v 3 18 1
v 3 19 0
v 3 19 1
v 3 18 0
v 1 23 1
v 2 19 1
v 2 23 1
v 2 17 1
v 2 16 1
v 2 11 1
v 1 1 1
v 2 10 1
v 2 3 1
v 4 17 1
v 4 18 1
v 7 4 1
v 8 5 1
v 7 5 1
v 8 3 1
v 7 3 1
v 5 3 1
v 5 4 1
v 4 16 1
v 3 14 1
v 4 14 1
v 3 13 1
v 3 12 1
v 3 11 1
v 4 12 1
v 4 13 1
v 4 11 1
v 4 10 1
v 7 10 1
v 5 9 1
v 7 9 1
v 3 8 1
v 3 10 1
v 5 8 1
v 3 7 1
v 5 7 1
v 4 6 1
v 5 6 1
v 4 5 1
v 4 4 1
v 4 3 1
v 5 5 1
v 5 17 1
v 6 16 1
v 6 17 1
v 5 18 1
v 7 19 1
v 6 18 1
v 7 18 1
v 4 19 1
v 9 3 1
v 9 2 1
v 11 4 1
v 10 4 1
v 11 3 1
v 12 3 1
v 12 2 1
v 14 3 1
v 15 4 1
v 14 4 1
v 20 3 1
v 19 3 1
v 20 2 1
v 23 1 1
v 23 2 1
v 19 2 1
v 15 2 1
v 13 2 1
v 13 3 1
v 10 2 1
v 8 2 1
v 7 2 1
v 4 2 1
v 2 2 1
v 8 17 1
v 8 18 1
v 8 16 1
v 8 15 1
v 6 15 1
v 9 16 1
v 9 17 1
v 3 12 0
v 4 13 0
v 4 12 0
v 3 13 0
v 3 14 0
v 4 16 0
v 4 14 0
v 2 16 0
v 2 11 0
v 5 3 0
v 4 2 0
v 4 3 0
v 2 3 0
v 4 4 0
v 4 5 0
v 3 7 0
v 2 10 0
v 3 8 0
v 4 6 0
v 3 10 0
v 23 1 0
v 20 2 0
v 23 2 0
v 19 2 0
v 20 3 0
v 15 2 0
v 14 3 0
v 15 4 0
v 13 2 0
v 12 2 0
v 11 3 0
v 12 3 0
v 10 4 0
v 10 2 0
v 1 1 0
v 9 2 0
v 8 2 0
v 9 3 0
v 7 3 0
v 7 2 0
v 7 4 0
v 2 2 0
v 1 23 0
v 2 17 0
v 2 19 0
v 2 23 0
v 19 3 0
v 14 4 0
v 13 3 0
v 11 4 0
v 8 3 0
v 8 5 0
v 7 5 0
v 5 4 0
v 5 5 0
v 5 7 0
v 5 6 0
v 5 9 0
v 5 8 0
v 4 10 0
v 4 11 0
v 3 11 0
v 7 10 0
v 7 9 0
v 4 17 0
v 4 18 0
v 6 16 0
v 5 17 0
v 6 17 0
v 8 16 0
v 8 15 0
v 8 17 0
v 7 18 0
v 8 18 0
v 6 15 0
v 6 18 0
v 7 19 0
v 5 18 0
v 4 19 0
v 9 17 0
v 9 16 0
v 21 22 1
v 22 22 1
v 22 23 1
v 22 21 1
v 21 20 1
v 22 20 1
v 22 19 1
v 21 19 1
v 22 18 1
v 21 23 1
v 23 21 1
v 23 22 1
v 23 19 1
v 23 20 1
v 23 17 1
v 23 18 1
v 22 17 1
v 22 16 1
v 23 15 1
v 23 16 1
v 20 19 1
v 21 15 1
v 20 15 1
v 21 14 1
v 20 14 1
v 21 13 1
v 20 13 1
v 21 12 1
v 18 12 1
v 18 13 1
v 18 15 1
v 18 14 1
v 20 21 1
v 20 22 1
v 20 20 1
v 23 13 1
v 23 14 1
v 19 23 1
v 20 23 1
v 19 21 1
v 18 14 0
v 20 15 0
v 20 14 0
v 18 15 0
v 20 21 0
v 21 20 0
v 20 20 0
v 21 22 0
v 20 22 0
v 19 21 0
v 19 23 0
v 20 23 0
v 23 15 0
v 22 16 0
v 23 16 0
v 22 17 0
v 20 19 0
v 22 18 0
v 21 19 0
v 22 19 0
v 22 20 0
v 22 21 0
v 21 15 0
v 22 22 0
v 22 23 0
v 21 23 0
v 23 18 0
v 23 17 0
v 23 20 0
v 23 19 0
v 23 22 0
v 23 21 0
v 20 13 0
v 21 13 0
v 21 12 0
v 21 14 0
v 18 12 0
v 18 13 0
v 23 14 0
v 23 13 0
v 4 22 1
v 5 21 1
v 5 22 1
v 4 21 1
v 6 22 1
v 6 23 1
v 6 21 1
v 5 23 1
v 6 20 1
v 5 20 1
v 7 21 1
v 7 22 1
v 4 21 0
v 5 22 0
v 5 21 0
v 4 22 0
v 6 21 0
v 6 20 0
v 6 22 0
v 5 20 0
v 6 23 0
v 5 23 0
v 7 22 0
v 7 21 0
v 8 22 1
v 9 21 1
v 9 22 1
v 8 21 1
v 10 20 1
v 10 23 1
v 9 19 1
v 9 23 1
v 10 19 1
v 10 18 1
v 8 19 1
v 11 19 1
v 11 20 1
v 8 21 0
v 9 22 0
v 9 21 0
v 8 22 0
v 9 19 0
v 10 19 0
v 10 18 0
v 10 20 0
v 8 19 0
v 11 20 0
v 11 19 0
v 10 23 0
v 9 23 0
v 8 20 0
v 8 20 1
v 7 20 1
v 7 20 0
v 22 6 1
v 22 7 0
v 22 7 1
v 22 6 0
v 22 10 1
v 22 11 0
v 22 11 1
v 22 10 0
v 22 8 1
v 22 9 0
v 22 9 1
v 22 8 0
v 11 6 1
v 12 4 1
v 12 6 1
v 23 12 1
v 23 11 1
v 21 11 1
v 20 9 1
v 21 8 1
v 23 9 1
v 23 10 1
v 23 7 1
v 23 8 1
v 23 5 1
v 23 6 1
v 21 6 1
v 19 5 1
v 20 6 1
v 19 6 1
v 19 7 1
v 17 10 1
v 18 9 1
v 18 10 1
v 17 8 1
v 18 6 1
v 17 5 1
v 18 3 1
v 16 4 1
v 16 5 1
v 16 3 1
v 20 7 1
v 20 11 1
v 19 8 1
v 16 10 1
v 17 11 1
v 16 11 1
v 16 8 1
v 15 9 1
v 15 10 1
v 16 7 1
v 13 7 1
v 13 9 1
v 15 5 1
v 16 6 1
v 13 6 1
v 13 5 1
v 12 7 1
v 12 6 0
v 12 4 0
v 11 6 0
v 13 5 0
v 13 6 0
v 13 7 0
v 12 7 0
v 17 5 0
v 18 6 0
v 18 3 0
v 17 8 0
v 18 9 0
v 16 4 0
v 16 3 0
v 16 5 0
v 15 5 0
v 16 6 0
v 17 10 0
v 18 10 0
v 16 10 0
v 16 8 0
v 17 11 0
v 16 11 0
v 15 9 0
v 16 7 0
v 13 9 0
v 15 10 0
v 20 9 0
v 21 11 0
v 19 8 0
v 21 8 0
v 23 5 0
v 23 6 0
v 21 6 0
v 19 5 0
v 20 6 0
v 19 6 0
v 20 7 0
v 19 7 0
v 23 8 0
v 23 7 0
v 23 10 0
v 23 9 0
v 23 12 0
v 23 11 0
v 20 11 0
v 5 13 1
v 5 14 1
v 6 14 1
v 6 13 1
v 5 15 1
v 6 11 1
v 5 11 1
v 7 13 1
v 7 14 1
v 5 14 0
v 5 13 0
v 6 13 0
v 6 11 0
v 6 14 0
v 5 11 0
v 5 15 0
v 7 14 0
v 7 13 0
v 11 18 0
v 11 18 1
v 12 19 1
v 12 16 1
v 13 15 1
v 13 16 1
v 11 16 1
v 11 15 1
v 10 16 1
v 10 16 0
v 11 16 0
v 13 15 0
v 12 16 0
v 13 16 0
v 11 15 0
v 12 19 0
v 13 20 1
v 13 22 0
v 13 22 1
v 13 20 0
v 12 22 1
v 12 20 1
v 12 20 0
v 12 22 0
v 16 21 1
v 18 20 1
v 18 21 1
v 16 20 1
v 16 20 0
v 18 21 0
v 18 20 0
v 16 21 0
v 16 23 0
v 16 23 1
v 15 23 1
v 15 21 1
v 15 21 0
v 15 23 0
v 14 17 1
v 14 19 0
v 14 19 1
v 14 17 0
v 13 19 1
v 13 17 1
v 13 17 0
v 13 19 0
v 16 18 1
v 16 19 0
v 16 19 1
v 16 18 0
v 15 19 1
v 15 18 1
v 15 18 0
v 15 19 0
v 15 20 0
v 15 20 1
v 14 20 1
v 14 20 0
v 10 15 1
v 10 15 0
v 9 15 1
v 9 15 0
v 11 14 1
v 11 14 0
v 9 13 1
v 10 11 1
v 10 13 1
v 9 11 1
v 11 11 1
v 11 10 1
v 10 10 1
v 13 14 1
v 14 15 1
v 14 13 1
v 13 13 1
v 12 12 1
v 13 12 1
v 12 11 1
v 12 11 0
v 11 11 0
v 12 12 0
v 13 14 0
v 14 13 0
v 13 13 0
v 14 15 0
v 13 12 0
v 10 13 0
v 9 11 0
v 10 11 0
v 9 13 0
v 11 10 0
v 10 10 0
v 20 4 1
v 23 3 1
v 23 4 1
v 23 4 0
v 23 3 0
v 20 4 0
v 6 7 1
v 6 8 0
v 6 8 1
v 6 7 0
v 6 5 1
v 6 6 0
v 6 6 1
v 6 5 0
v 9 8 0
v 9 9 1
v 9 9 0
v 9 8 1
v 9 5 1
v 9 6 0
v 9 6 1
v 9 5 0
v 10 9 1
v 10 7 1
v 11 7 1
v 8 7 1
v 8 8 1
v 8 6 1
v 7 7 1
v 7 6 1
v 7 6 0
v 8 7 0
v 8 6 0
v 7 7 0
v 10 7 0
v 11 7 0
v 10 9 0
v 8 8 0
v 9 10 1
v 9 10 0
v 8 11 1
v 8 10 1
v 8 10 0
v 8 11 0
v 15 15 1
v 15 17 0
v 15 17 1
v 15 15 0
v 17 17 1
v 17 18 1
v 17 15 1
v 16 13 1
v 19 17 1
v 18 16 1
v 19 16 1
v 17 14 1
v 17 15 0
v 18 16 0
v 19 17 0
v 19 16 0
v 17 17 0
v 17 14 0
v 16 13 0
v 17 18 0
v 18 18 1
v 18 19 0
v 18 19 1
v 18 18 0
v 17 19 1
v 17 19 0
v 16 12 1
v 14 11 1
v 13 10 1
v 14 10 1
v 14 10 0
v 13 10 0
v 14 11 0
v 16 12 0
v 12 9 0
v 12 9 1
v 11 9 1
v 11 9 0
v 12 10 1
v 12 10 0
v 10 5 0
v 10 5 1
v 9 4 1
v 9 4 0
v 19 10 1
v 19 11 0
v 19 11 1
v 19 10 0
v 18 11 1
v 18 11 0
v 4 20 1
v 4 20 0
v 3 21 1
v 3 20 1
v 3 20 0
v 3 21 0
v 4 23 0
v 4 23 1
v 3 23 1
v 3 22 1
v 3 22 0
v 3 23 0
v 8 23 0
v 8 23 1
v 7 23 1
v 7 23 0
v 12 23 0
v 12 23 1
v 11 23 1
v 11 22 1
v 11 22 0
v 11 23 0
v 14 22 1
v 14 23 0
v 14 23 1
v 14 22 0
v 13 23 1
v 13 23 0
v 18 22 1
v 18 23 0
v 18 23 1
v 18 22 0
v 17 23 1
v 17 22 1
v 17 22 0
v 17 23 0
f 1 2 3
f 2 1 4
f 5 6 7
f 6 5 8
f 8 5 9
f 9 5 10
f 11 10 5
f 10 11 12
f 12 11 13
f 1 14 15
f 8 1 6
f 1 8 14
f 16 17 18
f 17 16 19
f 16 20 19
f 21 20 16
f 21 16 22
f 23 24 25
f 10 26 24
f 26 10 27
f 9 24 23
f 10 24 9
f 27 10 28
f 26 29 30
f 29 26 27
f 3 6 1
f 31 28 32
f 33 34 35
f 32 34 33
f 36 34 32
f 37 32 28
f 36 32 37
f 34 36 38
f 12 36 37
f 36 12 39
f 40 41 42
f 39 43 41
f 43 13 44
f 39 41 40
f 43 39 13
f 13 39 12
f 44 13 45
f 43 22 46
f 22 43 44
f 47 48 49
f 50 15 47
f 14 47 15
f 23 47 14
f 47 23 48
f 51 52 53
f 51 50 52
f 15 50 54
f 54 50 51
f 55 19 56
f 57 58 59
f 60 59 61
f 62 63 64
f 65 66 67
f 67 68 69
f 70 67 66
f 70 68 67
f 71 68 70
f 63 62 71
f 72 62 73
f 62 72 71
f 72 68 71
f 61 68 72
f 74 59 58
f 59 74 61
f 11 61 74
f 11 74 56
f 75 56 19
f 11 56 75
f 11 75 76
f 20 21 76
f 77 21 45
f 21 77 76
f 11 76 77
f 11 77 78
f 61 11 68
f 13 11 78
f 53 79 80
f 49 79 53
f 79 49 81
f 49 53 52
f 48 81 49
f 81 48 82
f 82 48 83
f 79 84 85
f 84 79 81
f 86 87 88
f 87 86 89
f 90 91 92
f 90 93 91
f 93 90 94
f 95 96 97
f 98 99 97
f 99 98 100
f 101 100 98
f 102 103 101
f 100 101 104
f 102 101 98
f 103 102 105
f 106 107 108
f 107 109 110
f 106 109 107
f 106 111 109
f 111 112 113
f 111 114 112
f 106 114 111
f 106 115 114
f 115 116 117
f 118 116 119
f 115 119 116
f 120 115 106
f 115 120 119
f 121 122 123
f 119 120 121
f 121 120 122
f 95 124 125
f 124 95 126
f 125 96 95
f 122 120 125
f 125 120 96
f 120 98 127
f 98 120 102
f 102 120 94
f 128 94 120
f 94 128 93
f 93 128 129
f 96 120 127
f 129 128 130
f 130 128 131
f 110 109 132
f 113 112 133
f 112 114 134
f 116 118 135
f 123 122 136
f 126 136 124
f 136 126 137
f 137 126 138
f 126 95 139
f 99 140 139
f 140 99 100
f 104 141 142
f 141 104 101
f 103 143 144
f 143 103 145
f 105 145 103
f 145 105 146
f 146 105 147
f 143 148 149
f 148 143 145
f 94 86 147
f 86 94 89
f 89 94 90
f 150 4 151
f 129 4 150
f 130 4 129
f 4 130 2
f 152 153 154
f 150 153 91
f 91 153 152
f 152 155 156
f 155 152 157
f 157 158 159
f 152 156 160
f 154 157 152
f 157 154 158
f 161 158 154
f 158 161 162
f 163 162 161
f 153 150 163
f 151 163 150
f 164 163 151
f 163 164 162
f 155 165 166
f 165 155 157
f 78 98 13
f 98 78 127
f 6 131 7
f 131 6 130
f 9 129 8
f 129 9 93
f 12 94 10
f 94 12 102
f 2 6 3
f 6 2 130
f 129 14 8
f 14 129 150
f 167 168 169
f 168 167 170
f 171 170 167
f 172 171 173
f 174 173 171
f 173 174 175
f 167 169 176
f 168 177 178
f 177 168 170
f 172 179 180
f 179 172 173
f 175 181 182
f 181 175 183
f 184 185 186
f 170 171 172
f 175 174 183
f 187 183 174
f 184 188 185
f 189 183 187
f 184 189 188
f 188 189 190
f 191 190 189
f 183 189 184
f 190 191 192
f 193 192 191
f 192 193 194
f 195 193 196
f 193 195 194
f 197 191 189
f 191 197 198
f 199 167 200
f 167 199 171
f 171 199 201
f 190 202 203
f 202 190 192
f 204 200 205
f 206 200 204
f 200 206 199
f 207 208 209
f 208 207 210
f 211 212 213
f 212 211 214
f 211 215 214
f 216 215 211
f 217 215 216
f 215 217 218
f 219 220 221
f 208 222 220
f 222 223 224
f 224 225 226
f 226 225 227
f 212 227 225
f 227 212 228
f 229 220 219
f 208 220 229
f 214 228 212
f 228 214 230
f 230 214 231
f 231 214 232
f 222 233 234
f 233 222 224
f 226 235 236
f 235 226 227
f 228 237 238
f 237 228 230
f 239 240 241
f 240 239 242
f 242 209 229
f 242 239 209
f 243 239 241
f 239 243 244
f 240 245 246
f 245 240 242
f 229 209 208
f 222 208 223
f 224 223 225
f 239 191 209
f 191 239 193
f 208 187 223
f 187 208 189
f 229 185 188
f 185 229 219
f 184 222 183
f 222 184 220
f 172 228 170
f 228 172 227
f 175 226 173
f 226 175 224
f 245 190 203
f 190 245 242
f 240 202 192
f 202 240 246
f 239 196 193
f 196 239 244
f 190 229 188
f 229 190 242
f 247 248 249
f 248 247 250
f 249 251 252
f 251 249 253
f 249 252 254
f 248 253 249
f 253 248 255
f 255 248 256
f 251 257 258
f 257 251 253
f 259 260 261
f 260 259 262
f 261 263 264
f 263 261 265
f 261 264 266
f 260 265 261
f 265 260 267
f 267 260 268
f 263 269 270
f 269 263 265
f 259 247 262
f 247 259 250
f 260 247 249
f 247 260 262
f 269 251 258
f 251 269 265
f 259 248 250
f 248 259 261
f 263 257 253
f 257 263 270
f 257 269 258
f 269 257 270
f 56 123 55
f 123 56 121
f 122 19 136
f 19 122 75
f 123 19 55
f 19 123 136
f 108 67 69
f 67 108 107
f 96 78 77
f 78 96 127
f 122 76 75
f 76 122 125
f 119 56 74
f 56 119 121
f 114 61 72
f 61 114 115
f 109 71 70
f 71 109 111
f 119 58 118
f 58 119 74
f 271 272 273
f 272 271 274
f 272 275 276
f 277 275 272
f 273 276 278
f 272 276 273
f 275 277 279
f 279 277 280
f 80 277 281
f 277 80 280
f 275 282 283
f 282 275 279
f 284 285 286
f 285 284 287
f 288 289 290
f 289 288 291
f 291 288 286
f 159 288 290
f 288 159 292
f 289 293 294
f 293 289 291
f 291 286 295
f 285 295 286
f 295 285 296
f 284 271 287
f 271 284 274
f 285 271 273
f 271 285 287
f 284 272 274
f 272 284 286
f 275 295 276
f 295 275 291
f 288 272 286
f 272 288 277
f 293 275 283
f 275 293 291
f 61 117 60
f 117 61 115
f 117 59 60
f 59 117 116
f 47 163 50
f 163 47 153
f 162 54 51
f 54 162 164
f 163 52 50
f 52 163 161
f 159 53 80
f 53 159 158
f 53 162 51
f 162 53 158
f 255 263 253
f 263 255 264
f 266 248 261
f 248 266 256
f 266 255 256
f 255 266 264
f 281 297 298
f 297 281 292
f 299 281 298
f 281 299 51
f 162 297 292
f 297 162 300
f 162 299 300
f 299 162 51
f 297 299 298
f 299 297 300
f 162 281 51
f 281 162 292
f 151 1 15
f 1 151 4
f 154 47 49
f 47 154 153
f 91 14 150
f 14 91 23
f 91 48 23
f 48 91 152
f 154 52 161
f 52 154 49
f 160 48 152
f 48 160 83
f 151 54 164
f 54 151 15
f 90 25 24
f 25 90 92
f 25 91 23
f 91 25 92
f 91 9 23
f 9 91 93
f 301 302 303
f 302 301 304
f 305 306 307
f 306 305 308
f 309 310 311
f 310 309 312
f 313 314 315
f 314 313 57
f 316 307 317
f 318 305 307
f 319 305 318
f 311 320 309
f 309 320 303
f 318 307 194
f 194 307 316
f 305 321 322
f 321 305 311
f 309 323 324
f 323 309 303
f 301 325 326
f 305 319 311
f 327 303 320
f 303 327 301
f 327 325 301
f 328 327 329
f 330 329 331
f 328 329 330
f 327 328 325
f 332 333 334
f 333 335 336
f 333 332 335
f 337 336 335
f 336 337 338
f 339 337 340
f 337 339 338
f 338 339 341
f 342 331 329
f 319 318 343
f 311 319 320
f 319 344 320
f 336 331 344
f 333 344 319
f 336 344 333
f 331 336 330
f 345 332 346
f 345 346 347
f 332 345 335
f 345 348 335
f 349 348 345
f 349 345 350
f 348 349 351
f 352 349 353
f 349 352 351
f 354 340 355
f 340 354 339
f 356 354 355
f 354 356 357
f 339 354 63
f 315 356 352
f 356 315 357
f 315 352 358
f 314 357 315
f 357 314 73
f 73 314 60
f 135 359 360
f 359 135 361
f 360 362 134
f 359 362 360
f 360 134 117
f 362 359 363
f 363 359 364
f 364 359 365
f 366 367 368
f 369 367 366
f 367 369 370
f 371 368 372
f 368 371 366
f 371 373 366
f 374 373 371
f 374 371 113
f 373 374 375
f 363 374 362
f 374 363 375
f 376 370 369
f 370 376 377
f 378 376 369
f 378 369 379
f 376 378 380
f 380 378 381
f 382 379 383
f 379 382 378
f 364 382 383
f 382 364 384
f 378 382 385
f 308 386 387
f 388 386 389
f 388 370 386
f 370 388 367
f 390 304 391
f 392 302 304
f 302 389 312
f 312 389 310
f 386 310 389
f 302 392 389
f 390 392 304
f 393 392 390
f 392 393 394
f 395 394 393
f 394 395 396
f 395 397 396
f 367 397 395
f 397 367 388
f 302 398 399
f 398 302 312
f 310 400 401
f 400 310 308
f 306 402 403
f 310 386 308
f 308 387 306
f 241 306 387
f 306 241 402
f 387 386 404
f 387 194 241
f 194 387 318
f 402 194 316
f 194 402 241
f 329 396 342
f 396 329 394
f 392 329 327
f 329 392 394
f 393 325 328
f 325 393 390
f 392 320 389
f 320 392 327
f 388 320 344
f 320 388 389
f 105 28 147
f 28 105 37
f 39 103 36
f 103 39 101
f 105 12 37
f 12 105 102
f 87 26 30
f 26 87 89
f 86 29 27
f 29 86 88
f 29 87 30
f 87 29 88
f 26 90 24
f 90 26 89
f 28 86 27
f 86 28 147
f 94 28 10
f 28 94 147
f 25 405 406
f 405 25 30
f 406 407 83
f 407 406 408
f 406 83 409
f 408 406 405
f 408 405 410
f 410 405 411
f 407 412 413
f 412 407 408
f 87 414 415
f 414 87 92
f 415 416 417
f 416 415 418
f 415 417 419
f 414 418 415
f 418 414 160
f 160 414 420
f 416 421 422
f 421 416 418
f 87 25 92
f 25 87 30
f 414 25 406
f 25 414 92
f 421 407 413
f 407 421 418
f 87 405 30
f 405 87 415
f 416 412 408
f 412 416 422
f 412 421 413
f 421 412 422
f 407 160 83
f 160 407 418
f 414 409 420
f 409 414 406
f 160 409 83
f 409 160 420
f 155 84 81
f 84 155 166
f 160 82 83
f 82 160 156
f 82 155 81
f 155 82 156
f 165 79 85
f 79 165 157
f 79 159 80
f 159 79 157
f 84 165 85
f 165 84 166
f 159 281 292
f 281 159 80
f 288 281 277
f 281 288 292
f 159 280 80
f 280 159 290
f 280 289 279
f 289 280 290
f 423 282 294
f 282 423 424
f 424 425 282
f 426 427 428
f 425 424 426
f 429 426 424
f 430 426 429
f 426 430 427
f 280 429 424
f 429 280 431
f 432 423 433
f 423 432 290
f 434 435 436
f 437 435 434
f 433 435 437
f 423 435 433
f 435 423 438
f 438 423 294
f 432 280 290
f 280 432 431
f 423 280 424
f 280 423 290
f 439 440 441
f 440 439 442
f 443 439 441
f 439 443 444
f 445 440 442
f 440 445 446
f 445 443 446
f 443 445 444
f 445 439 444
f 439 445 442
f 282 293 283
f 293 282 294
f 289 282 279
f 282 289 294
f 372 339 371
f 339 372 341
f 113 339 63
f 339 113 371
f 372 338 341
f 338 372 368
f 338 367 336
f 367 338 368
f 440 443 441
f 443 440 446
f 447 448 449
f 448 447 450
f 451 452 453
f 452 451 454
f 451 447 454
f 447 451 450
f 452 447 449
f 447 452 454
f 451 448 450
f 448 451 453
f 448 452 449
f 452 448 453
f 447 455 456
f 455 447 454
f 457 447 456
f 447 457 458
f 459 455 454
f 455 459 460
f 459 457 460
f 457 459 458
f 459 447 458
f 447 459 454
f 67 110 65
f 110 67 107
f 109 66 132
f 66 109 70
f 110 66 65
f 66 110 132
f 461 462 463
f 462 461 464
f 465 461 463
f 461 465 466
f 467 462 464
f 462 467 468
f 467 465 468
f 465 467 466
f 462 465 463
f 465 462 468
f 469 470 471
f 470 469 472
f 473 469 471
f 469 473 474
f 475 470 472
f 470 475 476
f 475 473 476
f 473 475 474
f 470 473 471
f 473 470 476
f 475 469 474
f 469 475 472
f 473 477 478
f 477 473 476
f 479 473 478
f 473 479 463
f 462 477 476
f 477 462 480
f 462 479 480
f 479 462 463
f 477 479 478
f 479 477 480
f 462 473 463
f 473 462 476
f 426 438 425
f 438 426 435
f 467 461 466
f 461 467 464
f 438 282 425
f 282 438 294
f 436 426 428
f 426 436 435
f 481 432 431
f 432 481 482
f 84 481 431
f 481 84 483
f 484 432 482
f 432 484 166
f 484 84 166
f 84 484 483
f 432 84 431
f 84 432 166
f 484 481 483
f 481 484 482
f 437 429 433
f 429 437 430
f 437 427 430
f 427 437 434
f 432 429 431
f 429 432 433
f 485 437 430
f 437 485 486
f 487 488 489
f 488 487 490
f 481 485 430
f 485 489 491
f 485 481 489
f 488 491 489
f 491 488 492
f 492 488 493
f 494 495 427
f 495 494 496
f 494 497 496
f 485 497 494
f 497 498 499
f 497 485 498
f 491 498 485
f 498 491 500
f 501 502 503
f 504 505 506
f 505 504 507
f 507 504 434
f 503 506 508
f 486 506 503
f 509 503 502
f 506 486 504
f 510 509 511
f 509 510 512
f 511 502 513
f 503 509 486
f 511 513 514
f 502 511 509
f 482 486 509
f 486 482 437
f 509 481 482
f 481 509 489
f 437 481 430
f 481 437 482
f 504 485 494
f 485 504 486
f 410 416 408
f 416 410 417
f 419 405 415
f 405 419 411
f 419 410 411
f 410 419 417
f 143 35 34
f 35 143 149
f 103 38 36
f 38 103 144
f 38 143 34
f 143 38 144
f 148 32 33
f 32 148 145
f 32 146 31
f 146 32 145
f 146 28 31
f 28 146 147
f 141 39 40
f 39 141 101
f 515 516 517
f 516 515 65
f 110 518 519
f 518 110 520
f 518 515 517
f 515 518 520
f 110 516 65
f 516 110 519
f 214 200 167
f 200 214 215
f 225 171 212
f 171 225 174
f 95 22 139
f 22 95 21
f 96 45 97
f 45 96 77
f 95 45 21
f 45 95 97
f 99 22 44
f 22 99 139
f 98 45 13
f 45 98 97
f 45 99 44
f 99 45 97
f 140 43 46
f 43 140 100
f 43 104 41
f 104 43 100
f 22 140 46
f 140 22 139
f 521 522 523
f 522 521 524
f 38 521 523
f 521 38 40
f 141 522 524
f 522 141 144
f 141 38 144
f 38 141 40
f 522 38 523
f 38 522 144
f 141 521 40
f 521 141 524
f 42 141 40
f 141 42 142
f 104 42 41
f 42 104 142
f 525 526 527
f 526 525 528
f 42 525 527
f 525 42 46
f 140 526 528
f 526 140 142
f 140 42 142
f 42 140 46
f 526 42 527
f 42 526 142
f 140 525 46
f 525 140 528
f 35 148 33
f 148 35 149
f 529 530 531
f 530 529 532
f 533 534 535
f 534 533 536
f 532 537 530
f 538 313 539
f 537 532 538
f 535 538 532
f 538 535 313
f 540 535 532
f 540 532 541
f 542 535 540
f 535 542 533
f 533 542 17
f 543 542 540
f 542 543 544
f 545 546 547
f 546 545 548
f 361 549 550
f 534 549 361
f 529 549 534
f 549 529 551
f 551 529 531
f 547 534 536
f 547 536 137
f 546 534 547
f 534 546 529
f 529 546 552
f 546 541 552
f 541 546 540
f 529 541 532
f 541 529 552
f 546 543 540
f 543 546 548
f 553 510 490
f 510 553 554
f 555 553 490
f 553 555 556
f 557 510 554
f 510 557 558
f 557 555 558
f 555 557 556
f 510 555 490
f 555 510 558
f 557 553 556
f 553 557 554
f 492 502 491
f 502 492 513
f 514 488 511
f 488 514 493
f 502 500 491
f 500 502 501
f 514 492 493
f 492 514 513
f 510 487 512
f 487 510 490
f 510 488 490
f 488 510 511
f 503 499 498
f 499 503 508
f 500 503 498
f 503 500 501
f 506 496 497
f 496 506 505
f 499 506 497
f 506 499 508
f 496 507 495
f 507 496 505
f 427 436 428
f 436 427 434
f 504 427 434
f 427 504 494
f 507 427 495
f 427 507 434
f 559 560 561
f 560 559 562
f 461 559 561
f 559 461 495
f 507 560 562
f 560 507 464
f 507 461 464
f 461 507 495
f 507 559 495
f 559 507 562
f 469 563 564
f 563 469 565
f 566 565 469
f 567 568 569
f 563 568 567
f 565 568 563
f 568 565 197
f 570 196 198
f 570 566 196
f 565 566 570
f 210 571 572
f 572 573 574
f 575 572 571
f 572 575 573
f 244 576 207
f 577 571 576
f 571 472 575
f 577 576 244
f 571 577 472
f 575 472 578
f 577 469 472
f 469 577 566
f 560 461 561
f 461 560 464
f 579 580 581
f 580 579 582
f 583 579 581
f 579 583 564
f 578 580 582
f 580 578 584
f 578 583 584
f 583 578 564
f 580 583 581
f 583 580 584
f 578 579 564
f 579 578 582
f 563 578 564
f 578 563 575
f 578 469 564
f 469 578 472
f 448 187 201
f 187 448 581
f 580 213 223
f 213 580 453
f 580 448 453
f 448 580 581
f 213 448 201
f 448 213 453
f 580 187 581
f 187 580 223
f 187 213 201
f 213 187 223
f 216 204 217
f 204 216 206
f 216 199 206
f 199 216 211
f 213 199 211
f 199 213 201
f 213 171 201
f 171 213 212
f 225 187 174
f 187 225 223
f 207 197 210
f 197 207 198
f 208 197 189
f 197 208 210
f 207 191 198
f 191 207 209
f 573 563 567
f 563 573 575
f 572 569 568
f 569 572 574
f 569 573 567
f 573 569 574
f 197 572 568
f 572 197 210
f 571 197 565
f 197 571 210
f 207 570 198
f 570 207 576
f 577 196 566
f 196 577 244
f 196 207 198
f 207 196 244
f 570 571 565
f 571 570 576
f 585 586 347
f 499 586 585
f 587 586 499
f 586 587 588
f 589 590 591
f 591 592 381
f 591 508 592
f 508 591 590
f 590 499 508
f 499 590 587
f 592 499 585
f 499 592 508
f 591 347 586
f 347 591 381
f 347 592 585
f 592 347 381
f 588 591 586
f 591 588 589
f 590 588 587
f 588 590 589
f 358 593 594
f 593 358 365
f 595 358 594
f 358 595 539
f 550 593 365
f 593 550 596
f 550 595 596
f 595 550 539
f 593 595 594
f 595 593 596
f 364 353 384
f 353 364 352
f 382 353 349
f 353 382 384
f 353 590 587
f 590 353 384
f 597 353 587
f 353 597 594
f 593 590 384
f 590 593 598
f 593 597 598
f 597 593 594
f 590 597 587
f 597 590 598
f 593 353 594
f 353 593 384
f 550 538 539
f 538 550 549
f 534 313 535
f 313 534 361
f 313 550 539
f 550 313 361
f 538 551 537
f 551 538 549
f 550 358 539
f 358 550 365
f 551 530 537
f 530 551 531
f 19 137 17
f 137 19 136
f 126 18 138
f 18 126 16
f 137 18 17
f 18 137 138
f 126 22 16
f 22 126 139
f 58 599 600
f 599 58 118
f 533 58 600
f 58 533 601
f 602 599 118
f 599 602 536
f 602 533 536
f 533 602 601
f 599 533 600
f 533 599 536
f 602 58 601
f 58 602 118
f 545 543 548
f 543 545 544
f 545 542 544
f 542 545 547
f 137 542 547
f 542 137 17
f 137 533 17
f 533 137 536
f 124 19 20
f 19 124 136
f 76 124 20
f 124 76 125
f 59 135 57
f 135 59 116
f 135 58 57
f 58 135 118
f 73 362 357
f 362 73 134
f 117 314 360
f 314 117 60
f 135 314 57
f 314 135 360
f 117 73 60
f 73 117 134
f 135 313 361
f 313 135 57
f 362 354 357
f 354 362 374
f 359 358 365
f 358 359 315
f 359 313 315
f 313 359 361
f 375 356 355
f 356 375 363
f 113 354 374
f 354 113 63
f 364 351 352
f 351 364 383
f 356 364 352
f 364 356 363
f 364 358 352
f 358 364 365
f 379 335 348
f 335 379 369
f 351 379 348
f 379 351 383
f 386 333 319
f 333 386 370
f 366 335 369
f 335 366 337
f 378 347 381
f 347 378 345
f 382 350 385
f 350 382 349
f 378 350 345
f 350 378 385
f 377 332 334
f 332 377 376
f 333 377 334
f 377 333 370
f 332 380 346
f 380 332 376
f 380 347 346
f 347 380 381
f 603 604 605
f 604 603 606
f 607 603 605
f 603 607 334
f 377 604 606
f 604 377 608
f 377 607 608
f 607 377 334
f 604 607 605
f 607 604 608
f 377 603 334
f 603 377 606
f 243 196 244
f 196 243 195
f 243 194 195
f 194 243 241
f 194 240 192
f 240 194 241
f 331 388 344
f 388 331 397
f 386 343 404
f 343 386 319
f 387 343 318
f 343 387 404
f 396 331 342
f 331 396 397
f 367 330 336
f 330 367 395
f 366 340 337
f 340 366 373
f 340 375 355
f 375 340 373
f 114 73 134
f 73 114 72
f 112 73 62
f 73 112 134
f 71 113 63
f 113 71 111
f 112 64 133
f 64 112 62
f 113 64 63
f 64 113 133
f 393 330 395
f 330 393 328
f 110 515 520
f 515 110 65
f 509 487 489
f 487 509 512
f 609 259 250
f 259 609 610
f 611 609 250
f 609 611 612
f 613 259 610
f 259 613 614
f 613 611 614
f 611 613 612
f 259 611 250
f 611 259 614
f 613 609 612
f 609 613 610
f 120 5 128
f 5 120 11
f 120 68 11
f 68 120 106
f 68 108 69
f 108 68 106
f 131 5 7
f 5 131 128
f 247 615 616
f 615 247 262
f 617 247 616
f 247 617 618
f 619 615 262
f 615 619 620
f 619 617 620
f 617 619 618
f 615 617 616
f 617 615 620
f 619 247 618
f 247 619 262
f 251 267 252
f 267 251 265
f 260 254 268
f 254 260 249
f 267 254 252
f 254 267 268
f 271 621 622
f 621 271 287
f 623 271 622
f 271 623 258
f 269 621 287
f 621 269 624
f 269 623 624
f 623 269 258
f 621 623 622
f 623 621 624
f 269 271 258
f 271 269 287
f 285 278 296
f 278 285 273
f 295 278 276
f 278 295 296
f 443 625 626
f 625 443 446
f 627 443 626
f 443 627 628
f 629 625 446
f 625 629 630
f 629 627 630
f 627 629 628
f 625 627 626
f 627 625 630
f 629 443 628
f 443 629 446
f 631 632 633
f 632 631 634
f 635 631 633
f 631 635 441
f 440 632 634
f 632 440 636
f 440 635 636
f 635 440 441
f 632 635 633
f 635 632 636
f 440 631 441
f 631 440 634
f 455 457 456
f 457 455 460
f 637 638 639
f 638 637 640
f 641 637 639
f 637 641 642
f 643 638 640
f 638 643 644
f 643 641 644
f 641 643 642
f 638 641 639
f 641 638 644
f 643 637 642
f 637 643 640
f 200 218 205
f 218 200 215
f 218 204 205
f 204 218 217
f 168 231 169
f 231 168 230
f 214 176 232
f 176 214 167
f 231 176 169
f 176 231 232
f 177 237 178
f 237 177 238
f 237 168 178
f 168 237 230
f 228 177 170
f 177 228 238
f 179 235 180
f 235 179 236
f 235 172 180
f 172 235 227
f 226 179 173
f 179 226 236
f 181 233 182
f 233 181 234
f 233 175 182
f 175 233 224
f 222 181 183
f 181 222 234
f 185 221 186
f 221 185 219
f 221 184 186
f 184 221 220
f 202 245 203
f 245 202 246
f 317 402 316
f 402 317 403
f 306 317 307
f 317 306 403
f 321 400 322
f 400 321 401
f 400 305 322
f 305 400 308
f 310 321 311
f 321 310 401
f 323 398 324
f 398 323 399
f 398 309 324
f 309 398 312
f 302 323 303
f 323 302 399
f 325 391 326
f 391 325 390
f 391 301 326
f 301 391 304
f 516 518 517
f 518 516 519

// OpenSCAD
// file: util/bitmap.scad
/*****************************************************************************
 * Module Bitmap Library
 * Modules to create bitmaps of unit squares from 1 or 2 dimensional vectors.
 *****************************************************************************
 * Copyright 2017 Chris Baker
 *
 * This program is free software: you can redistribute it and/or modify
 * it under the terms of the GNU Lesser General Public License as published by
 * the Free Software Foundation, either version 3 of the License, or
 * (at your option) any later version.
 *
 * This program is distributed in the hope that it will be useful,
 * but WITHOUT ANY WARRANTY; without even the implied warranty of
 * MERCHANTABILITY or FITNESS FOR A PARTICULAR PURPOSE.  See the
 * GNU Lesser General Public License for more details.
 *
 * You should have received a copy of the GNU Lesser General Public License
 * along with this program.  If not, see <http://www.gnu.org/licenses/>.
 *****************************************************************************
 * Usage:
 * Include this file with the "use" tag.
 * Depends on compat.scad library.
 *
 * API:
 *   1dbitmap(bitmap, center, expansion, vector_mode)
 *   2dbitmap(bitmap, center, expansion, vector_mode)
 *     Generate a 1 or 2-Dimensional field of modules based on the provided
 *     bitmap vector. See Bitmap Vectors below.
 *     The center flag determines whether to center the bitmap on the origin.
 *     The expansion value actually shrinks each cube in the x and y
 *     dimension by the specified amount.
 *     The vector_mode flag determines whether to create 3D solid geometry
 *     (unit cubes) or 2D vector geometry (squares).
 *
 * Bitmap Vectors:
 *   The bitmap vectors primarily provide boolean information.
 *   A module will be placed where these vectors have a postive value and
 *   skipped where they have a negative value. I.E. 0, -1, false, and undef
 *   are all equivalent and result in a skip. 1 and true are equivalent and
 *   result in a placed 1-unit module.
 *   Further, if the value is an integer it will be treated as a height for
 *   the module, allowing z-maps to be created.
 *   If the value is not an integer or boolean, it will be treated as a color
 *   reference. This can be a string or RGBA vector that will be used to
 *   color the module in the OpenSCAD preview window.
 *   In current versions of OpenSCAD, the color has no effect in the rendered
 *   view or STL output.
 *
 * Vector Mode:
 *   Although OpenSCAD supports generating 2D geometry, there are several
 *   caveats:
 *   - 2D and 3D geometry cannot be mixed
 *   - Extruding 2D geometry causes color information to be lost
 *   - All 2D geometry is projected onto the XY plane when rendering
 *   - Rendering also results in loss of color (same as 3D)
 *   - The SVG exporter is somewhat limited:
 *     - The pixel size of the image is hard-coded in the file
 *     - The title of the image is a generic string
 *     - The color selection for stroke and fill is fixed
 *     - The stroke-width is set to a large value that will cause overlap
 *     - The background is transparent
 *     - Only one path element is created with all of the geometry; there is
 *       no easy way to split up the geometry into multiple logical units.
 *     - These issues can mostly be resolved by hand-editing the file:
 *       - Remove or modify the width and height parameters from the svg
 *         element at the top of the file to provide better scaling.
 *       - Edit the title element at the top of the file to change the title.
 *       - Edit the stroke and fill parameters of the path element (these will
 *         probably be at the end of the file).
 *       - Set the stroke-width parameter for the path element to 0.
 *****************************************************************************/
use <compat.scad>

/*
 * 2dbitmap - Turn a 2D vector into a bitmap of cubes
 *
 * bitmap - 2D vector representing where to place each cube
 *          Value can either be boolean, z-height, or color
 * center - center cubes around the origin
 * expansion - size of gap around each pixel (screendoor)
 * vector_mode - create a 2D vector drawing instead of 3D extrusion
 */
module 2dbitmap(bitmap=[[1,0],[0,1]], center=false, expansion=0, vector_mode=false)
{
	ylen=len(bitmap)-1;

	for (y=[0:ylen]) {
		xlen=len(bitmap[y])-1;
		for (x=[0:xlen])
			translate([x-(center?xlen/2:0),ylen-y-(center?ylen/2:0),0])
				if (is_indexable(bitmap[y][x]))
					color(bitmap[y][x])
						if (vector_mode)
							square([1-expansion,1-expansion], center=center);
						else
							cube([1-expansion,1-expansion,1], center=center);
				else
					if (bitmap[y][x])
						if (vector_mode)
							square([1-expansion,1-expansion], center=center);
						else
							cube([1-expansion,1-expansion,clamp_nonnum(bitmap[y][x])], center=center);
	}
}

module 1dbitmap(bitmap=[1,0,1,0,1], center=false, expansion=0, vector_mode=false)
	2dbitmap([bitmap], center, expansion, vector_mode);

/*
 * Examples
 */

// 1D with z-height
translate([10,0,0]) scale([1,10,1])
	1dbitmap(bitmap=[1,1,0,2,0,0,3], expansion=.1);

// 1D with boolean
translate([-20,0,0]) scale([1,10,1])
	1dbitmap(bitmap=[true,false,true,false,true,true]);

// 2D with z-height
scale([2,2,1])
	2dbitmap(bitmap=[[1,0,2,1],[0,3,3,0],[1,1,0,1]],
		center=true);

// 1D with color
translate([0,-10,0]) scale([1,3,1])
	1dbitmap(bitmap=["red","white","blue",[0,0.3,0,0.5]]);

// 1D with color using 2D-vector-mode
translate([-7,-8,0]) scale([1,2])
	1dbitmap(bitmap=["red",0,"blue",0,"green"], vector_mode=true);
translate([-4.5,-10,0]) scale([1,2])
	1dbitmap(bitmap=["red",0,"blue",0,"green"], vector_mode=true, center=true);
// file: util/bitlib.scad
/*****************************************************************************
 * Bit Manipulation Library
 * Provides some useful bit manipulation functions.
 *****************************************************************************
 * Copyright 2017 Chris Baker
 *
 * This program is free software: you can redistribute it and/or modify
 * it under the terms of the GNU Lesser General Public License as published by
 * the Free Software Foundation, either version 3 of the License, or
 * (at your option) any later version.
 *
 * This program is distributed in the hope that it will be useful,
 * but WITHOUT ANY WARRANTY; without even the implied warranty of
 * MERCHANTABILITY or FITNESS FOR A PARTICULAR PURPOSE.  See the
 * GNU Lesser General Public License for more details.
 *
 * You should have received a copy of the GNU Lesser General Public License
 * along with this program.  If not, see <http://www.gnu.org/licenses/>.
 *****************************************************************************
 * Usage:
 * Include this file with the "use" tag.
 * When run on its own, all echo statements in this
 * library should print "true".
 *
 * API:
 *   bit(v,b)
 *     Return the truth value of the b'th bit of v.
 *
 *   check_bit_size(v,b,signed=false)
 *     Determine whether the value v can be represented
 *     with b bits (b must be positive).
 *     The signed flag indicates whether to include the
 *     sign bit in the determination; otherwise negative
 *     values will result in undef being returned.
 *
 *   xor(a,b)
 *     Return the value of a xor b.
 *     Handles arbitrary size values for a and b.
 *     Handles negative values as expected (a positive
 *     result will be returned unless a and b have
 *     differing signs).
 *
 * TODO:
 *  - Change echos to asserts (future OpenSCAD version)
 *  - Add more functions
 *
 *****************************************************************************/

//Return the truth value of the b'th bit of v
function bit(v,b) =
	((v==undef)||(b==undef)||(b<0))?undef:
	(floor(v / pow(2, b)) % 2)?true:false;

echo("*** bit() testcases ***");
echo(0,bit(0,0)==false);
echo(1,bit(-1,0)==true);
echo(2,bit(1,0)==true);
echo(3,[for (i=[0:63]) bit(0,i)]==[for (i=[0:63]) false]); //0=0...0
echo(4,[for (i=[0:63]) bit(-1,i)]==[for (i=[0:63]) true]); //-1=1...1
echo(5,[for (i=[1:63]) bit(1,i)]==[for (i=[1:63]) false]); //1=0...01
echo(6,[for (i=[0:7]) bit(85,i)?1:0]==[1,0,1,0,1,0,1,0]); //85=01010101
echo(7,[for (i=[0:7]) bit(170,i)?1:0]==[0,1,0,1,0,1,0,1]); //170=10101010
echo(8,[for (i=[0:7]) bit(165,i)?1:0]==[1,0,1,0,0,1,0,1]); //165=10100101
echo(9,[for (i=[0:7]) bit(56,i)?1:0]==[0,0,0,1,1,1,0,0]); //56=00111000
echo(10,[for (i=[0:7]) bit(-3,i)?1:0]==[1,0,1,1,1,1,1,1]); //-3=1...101
//(2^64)=0...01 0...0
echo(11,bit(pow(2,64),64)==true);
echo(12,[for (i=[0:63]) bit(pow(2,64),i)]==[for (i=[0:63]) false]);
echo(13,[for (i=[65:127]) bit(pow(2,64),i)]==[for (i=[1:63]) false]);
//-(2^64)=1...1 0...0
echo(14,[for (i=[0:63]) bit(-pow(2,64),i)]==[for (i=[0:63]) false]);
echo(15,[for (i=[64:127]) bit(-pow(2,64),i)]==[for (i=[0:63]) true]);
echo(16,bit(10,-1)==undef);
echo(17,bit(10,undef)==undef);
echo(18,bit(undef,3)==undef);

//return true if v can be represented in b bits
//if signed flag is set. the result will be adjusted
//to account for the needed sign bit
function check_bit_size(v,b,signed=false) =
	(b<0)?undef:
	(v==undef)?undef:
	(b==0)?false:
	(v==0)?true: //(b>0)
	(signed)?
		(v<0)?(-pow(2,b-1)<(v+1)):
			(pow(2,b-1)>(v+1)):
		(v<0)?undef:
			(pow(2,b)>v);

echo("*** check_bit_size() testcases ***");
echo(0,check_bit_size(-1,2)==undef);
echo(1,check_bit_size(2,-4)==undef);
echo(2,check_bit_size(2,-4,signed=true)==undef);
echo(3,check_bit_size(0,0)==false);
echo(4,check_bit_size(0,1)==true);
echo(5,check_bit_size(1,0)==false);
echo(6,check_bit_size(1,1)==true);
echo(7,check_bit_size(7,3)==true);
echo(8,check_bit_size(8,3)==false);
echo(9,check_bit_size(1,3)==true);
echo(10,check_bit_size(256,8)==false);
echo(11,check_bit_size(255,8)==true);
echo(12,check_bit_size(10,2)==false);
echo(13,check_bit_size(10,4)==true);
echo(14,check_bit_size(-10,2,signed=true)==false);
echo(15,check_bit_size(-10,4,signed=true)==false);
echo(16,check_bit_size(-10,5,signed=true)==true);
echo(17,check_bit_size(-1,0,signed=true)==false);
echo(18,check_bit_size(-1,1,signed=true)==true);
echo(19,check_bit_size(0,0,signed=true)==false);
echo(20,check_bit_size(0,1,signed=true)==true);
echo(21,check_bit_size(-2,2,signed=true)==true);
echo(22,check_bit_size(-3,2,signed=true)==false);
echo(23,check_bit_size(-3,3,signed=true)==true);
echo(24,check_bit_size(-8,3,signed=true)==false);
echo(25,check_bit_size(-8,4,signed=true)==true);
echo(26,check_bit_size(undef,4)==undef);
echo(27,check_bit_size(undef,4,signed=true)==undef);

//return the value of a xor b
//runs recursively until all bits of a and b are exhausted
function xor(a,b,i=0) =
	((a==undef)||(b==undef))?undef:
	let (c=bit(a,i), d=bit(b,i),
		 v=((c||d) && !(c&&d))?pow(2,i):0)
		(check_bit_size(a,i,signed=true) &&
		 check_bit_size(b,i,signed=true))?
			-v: //special case for sign bit
			v+xor(a,b,i+1); //recursively add powers of 2

echo("*** xor() testcases ***");
echo(0,xor(42,0)==42);
echo(1,xor(42,42)==0);
echo(2,xor(169,238)==71); //10101001^11101110=01000111=71
echo(3,xor(238,169)==71);
echo(4,xor(42,238)==196); //00101010^11101110=11000100=196
echo(5,xor(169,42)==131); //10101001^00101010=10000011=131
echo(6,xor(-8,-10)==14); //11000^10110=01110=14
echo(7,xor(-7,-10)==15); //11001^10110=01111=15
echo(8,xor(9,-10)==-1); //01001^10110=11111=-1
echo(9,xor(9,-12)==-3); //01001^10100=11101=-3
echo(10,xor(undef,0)==undef);
// main file
/*****************************************************************************
 * Data Matrix Symbol Library
 * Generates Data Matrix 2D barcodes
 *****************************************************************************
 * Copyright 2017 Chris Baker
 *
 * This program is free software: you can redistribute it and/or modify
 * it under the terms of the GNU Lesser General Public License as published by
 * the Free Software Foundation, either version 3 of the License, or
 * (at your option) any later version.
 *
 * This program is distributed in the hope that it will be useful,
 * but WITHOUT ANY WARRANTY; without even the implied warranty of
 * MERCHANTABILITY or FITNESS FOR A PARTICULAR PURPOSE.  See the
 * GNU Lesser General Public License for more details.
 *
 * You should have received a copy of the GNU Lesser General Public License
 * along with this program.  If not, see <http://www.gnu.org/licenses/>.
 *****************************************************************************
 * Usage:
 * Include this file with the "use" tag.
 *
 * Library Dependencies:
 * - util/bitlib.scad
 * - util/bitmap.scad
 * - util/datamatrix-util.scad
 *
 * API:
 *   data_matrix(bytes, size, corner, mark, space)
 *     Generates a DataMatrix symbol with contents specified by bytes.
 *     The size parameter is the dimension of the symbol.
 *     The corner parameter will depend on the overall size and should be
 *     automated in the future.
 *     The mark and space parameters can be used to change the appearance of
 *     the symbol. See the bitmap library for more details.
 *
 *   dm_ascii(string, frob_digits=true)
 *     Returns a suitable byte array representing string, encoded in
 *     DataMatrix ASCII encoding.
 *     Pairs of digits are normally compacted, but this can be forcibly
 *     disabed by setting frob_digits=false.
 *     See ascii_mode() below, but ASCII is the default.
 *
 *   dm_text(string)
 *     Returns a suitable byte array representing string, encoded in
 *     DataMatrix text encoding.
 *     See text_mode() below.
 *
 *   dm_c40(string)
 *     Returns a suitable byte array representing string, encoded in
 *     DataMatrix C40 encoding.
 *     See c40_mode() below.
 *
 *   dm_base256(data, pos, fills_symbol=false)
 *     Encode the data byte vector using DataMatrix base-256 encoding
 *     algorithm (mod 255). A 1 or 2 byte length prefix is prepended to the
 *     data automatically.
 *     The nature of the algorithm means that it needs pos to be the starting
 *     byte position of the data bytes within the overall symbol data field.
 *     See also helper function dm_base256_append().
 *     The fills_symbol flag can be used by experts.
 *     See base256_mode() below.
 *
 *   dm_base256_append(preceding_data, byte_data, fills_symbol=false)
 *     Helper function to append dm_base256(byte_data, _pos_) to
 *     preceding_data, where _pos_ is determined automatically.
 *     The final byte of preceding_data must be 'base256_mode()'.
 *     The fills_symbol flag can be used by experts.
 *
 * See Also:
 *   Helper functions from util/datamatrix-util.scad:
 *   - dm_pad(data, data_size)
 *   - dm_ecc(data)
 *
 * TODO:
 *  - Determine ideal data size (and ecc size) automatically from supplied
 *    data byte vector
 *  - Determine dimensions and corner type from ideal data size
 *  - Add support for 32x32, 36x36, 40x40, 44x44, 48x48
 *  - Add support for rectangular matrixes
 *  - Add support for larger sizes than 48x48
 *  - Add other encoding modes
 *
 *****************************************************************************/
use <util/bitlib.scad>
use <util/bitmap.scad>
use <util/datamatrix-util.scad>

/* Some definitions of useful data bytes that can be
   concatenated into your byte string */
function EOM() = 129; // end-of-message (first padding byte)
function c40_mode() = 230; // begin C40 encoding mode
function base256_mode() = 231; // begin base-256 (byte) encoding mode
function fnc1_mode() = 232; // begin FNC1 (GS1-DataMatrix) encoding mode
function text_mode() = 239; // begin text encoding mode
function ascii_mode() = 254; // return to ASCII encoding mode
function unused() = 0; // 0 is explicitly not used as a control code

/*
 * dm_codeword - generate a single codeword as a 2D array
 *   suitable for passing to the 2dbitmap module
 *
 * x - data byte to encode
 * M - mark value
 * S - space value
 * (see documentation in bitmap.scad)
 */
function dm_codeword(x, M=1, S=0) = [
	[bit(x,7)?M:S, bit(x,6)?M:S, 0],
	[bit(x,5)?M:S, bit(x,4)?M:S, bit(x,3)?M:S],
	[bit(x,2)?M:S, bit(x,1)?M:S, bit(x,0)?M:S]
];

/*
 * ascii_to_dec - convert ASCII string to decimal vector
 *
 * a - the ASCII string to vectorize
 */
function ascii_to_dec(a) =
[
	for (i = [0 : len(a) - 1])
		let (val = search(a, "\x01\x02\x03\x04\x05\x06\x07\x08\x09\x0a\x0b\x0c\x0d\x0e\x0f\x10\x11\x12\x13\x14\x15\x16\x17\x18\x19\x1a\x1b\x1c\x1d\x1e\x1f !\"#$%&'()*+,-./0123456789:;<=>?@ABCDEFGHIJKLMNOPQRSTUVWXYZ[\\]^_`abcdefghijklmnopqrstuvwxyz{|}~\x7f"))
			val[i]+1
];

//take the ASCII byte vector and convert it to
//the DM ASCII encoding
//compacting of digit pairs can be forcibly disabled
function frobulate(vec, frob_digits=true, i=0) =
	(i==len(vec))?[]: //terminate recursion
		let(
			inc=frob_digits?
				(
					//check for digit pairs
					((vec[i]>=48)&&(vec[i]<=57) &&
					 (vec[i+1]>=48)&&(vec[i+1]<=57))?2:1
				):1,
			val=(inc==2)?
				(vec[i]-48)*10+(vec[i+1]-48)+130:
				vec[i]+1
		)
		concat(val, frobulate(vec, frob_digits, i+inc));
/*
 * dm_ascii - convert ASCII string to byte vector encoded in
 *   DataMatrix ASCII mode
 *
 * string - the ASCII string to encode
 * frob_digits - whether to compact digit pairs
 */
function dm_ascii(string, frob_digits=true) =
	let (vec=ascii_to_dec(string))
	frobulate(vec,frob_digits);

function ascii_to_text(a) =
	let (
		bytearray =
		[
			for (val=search(a, " 0123456789abcdefghijklmnopqrstuvwxyz\x01\x02\x03\x04\x05\x06\x07\x08\x09\x0a\x0b\x0c\x0d\x0e\x0f\x10\x11\x12\x13\x14\x15\x16\x17\x18\x19\x1a\x1b\x1c\x1d\x1e\x1f!\"#$%&'()*+,-./:;<=>?@[\\]^_`ABCDEFGHIJKLMNOPQRSTUVWXYZ{|}~\x7f"))
				(val>=95)?[2,val-95]:
				(val>=68)?[1,val-68]:
				(val>=37)?[0,val-37+1]:
				[val+3]
		]
	) [ for (B=bytearray, b=B) b ];

function ascii_to_c40(a) =
	let (
		bytearray =
		[
			for (val=search(a, " 0123456789ABCDEFGHIJKLMNOPQRSTUVWXYZ\x01\x02\x03\x04\x05\x06\x07\x08\x09\x0a\x0b\x0c\x0d\x0e\x0f\x10\x11\x12\x13\x14\x15\x16\x17\x18\x19\x1a\x1b\x1c\x1d\x1e\x1f!\"#$%&'()*+,-./:;<=>?@[\\]^_`abcdefghijklmnopqrstuvwxyz{|}~\x7f"))
				(val>=95)?[2,val-95]:
				(val>=68)?[1,val-68]:
				(val>=37)?[0,val-37+1]:
				[val+3]
		]
	) [ for (B=bytearray, b=B) b ];

/*
 * dm_text - convert ASCII string to byte vector encoded in
 *   DataMatrix text mode
 *
 * string - the ASCII string to encode
 */
function dm_text(string) =
	let (
		bytearray = ascii_to_text(string),
		bytelen = len(bytearray)
	) [	for (
			i=[0:3:bytelen-1],
			packedval=bytearray[i]*1600+bytearray[i+1]*40+bytearray[i+2]+1,
			bytepair=[floor(packedval/256),packedval%256]
		) bytepair ];

/*
 * dm_c40 - convert ASCII string to byte vector encoded in
 *   DataMatrix C40 mode
 *
 * string - the ASCII string to encode
 */
function dm_c40(string) =
	let (
		bytearray = ascii_to_c40(string),
		bytelen = len(bytearray)
	) [	for (
			i=[0:3:bytelen-1],
			packedval=bytearray[i]*1600+bytearray[i+1]*40+bytearray[i+2]+1,
			bytepair=[floor(packedval/256),packedval%256]
		) bytepair ];

/*
 * dm_base256 - encode byte vector in DataMatrix base-256 mode
 *
 * data - the byte data to encode
 * pos - the starting byte position of the data within the
 *   overall symbol data field
 *   note: at least base256_mode()=231 will precede the byte
 *   data so this value can not be 0
 *   see also: dm_base256_append()
 * fills_symbol - indicates that the data vector fills out
 *   the remainder of the symbol by itself -- this attribute
 *   is a little bit awkward and I'm not sure that it is
 *   really necessary; so, if in doubt, leave it false
 */
function dm_base256(data, pos=1, fills_symbol=false) =
	let(l = len(data))
		(l==0)?undef:
		let(prefix =
			(fills_symbol)?[0]:
			(l<250)?[l]:
			[249+floor(l/250),l%250],
			message=concat(prefix,data)
		)
		[
			for (i=[0:len(message)-1])
				((((149*(i+pos+1))%255)+1+message[i])%256)
		];

/*
 * dm_base256_append - encode byte vector in DataMatrix
 *	 base-256 mode and append it to some existing data
 *
 * preceding_data - the pre-existing data to append this to
 *   note: must end with base256_mode()=231
 * byte_data - the byte data to encode
 * fills_symbol - indicates that the data vector fills out
 *   the remainder of the symbol by itself -- this attribute
 *   is a little bit awkward and I'm not sure that it is
 *   really necessary; so, if in doubt, leave it false
 */
function dm_base256_append(preceding_data, byte_data, fills_symbol=false) =
	let (l = len(preceding_data))
		(preceding_data[l-1]!=base256_mode())?undef:
		concat(preceding_data, dm_base256(byte_data, l, fills_symbol));

/*
 * data_matrix - Generate a DataMatrix barcode
 *
 * bytes - data bytes to encode
 * size - dimensions of the barcode (must be multiple of two)
 * corner - corner style to use
 * (TODO: determine this automatically)
 *
 * mark - mark representation
 * space - space representation
 * (see documentation in bitmap.scad)
 */
module data_matrix(bytes, size, corner, mark=1, space=0)
{
	if ((size==undef) || (size.x%2) || (size.y%2))
		echo("WARNING: size must be a multiple of two in each dimension");

	//split the codeword into two, selecting columns
	function colsplit(s, x) =
	[
		for(i=[0:2]) // iterate over all 3 rows
		[
			// select left-most 1 or 2 columns if x is positive
			// select right-most 1 or 2 columns if x is negative
			for (j=[((x<0)?-x:0) : ((x<0)?2:x-1)])
				s[i][j]
		]
	];

	//split the codeword into two, selecting rows
	function rowsplit(s, y) =
	[
		// select top-most 1 or 2 rows if y is positive
		// select bottom-most 1 or 2 rows if y is negative
		for (i=[((y<0)?3+y:0) : ((y<0)?2:2-y)])
			s[i]
	];

	//split the codeword into two parts for the
	//upper right and lower left corner
	//todo: calculate corner shape automatically
	module drawcorner1(s, size, corner)
	{

		if (2==corner)
			translate([size.x-6,-2,0])
				2dbitmap([
					[s[1][1],s[1][2],s[2][0],s[2][1]],
					[0,0,0,s[2][2]]
				]);
		else /* 1==corner */
			translate([size.x-4,-4,0])
				2dbitmap([
					[s[1][1],s[1][2]],
					[0,s[2][0]],
					[0,s[2][1]],
					[0,s[2][2]]
				]);
	}

	module drawcorner2(s, size, corner)
	{
		if (2==corner)
			translate([0,-size.y+2,0])
				2dbitmap([
					[s[0][0]],
					[s[0][1]],
					[s[1][0]]
				]);
		else /* 1==corner */
			translate([0,-size.y+2,0])
				2dbitmap([
					[s[0][0],s[0][1],s[1][0]]
				]);
	}

	//x-adjustment for split codewords (based on corner type)
	function splitx(size)=
		(26==size.x)?0:
		(24==size.x)?2:
		(22==size.x)?4:
		(20==size.x)?-2:
		(18==size.x)?0:
		(16==size.x)?2:
		(14==size.x)?4:
		(12==size.x)?-2:
		(10==size.x)?0:
		0;

	//y-adjustment for split codewords (based on corner type)
	function splity(size)=
		(26==size.y)?0:
		(24==size.y)?-2:
		(22==size.y)?-4:
		(20==size.y)?2:
		(18==size.y)?0:
		(16==size.y)?-2:
		(14==size.y)?-4:
		(12==size.y)?2:
		(10==size.y)?0:
		0;

	//check whether x,y have entered the upper-right corner
	//codeword shape (based on corner type)
	function check_corner_collision(corner, size, x, y)=
		(1==corner)?
			((y+3>0) && (x+10>size.x)):
		(2==corner)?
			((y+4>0) && (x+10>size.x)):
		false;

	//generate a filler shape for unused area
	function unusedshape(size, M=1, S=0)=
		(4==((size.x-2)*(size.y-2))%8)?
		[
			[M,S],
			[S,M]
		]:undef;

	//draw the codeword bitmap at the given x,y
	//coordinates
	//uses size and corner type to split the codeword
	//across the edges of the symbol
	module draw_codeword(bitmap, size, corner, x, y)
	{
		if (x<0) {
			if ((corner) && (-y+4>size.y)) {
				drawcorner1(bitmap, size, corner);
				drawcorner2(bitmap, size, corner);
			} else {
				translate([0,y,0])
					2dbitmap(colsplit(bitmap, x));
				translate([size.x+x-2,y+splity(size),0])
					2dbitmap(colsplit(bitmap, -x));
			}
		} else {
			if (y+2>=0) {
				translate([x,y,0])
					2dbitmap(rowsplit(bitmap, y));
				translate([x+splitx(size),-size.y+2,0])
					2dbitmap(rowsplit(bitmap, -y));
			} else {
				translate([x,y,0])
					2dbitmap(bitmap);
			}
		}
	}

	//draw individual codewords from bytes array
	//this module is called recursively with i, x, y, and direction
	//iterating across the data region of the symbol
	//size and corner define the shape of the symbol
	module data_matrix_inner(bytes, size, corner, mark=1, space=0, i=0, x=-2, y=-5, direction=0)
	{
		//echo(str("DEBUG x=", x, " y=", y, " dir=", direction%2, " val=", bytes[i]));

		// convert the byte to a codeword bitmap
		bitmap=(bytes[i]==undef)?undef:dm_codeword(bytes[i], mark, space);

		// draw the codeword
		if (bitmap==undef)
			translate([size.x-4,-size.y+2,0])
				2dbitmap(unusedshape(size, mark, space));
		else
			draw_codeword(bitmap, size, corner, x, y);

		// recurse
		if (i<len(bytes)) {
			if (direction%2) {
				if (x<0) {
					if (-y+2>=size.y) {
						new_dir = direction+1;
						new_x=x+5;
						new_y=y+1;
						data_matrix_inner(bytes, size, corner, mark, space, i+1, new_x, new_y, new_dir);
					} else if (-y+4>=size.y) {
						new_dir = direction+1;
						new_x=x+3;
						new_y=y-1;
						data_matrix_inner(bytes, size, corner, mark, space, i+1, new_x, new_y, new_dir);
					} else {
						new_dir = direction+1;
						new_x=x-2+1;
						new_y=y-2-3;
						data_matrix_inner(bytes, size, corner, mark, space, i+1, new_x, new_y, new_dir);
					}
				} else if (-y+2>=size.y) {
					new_dir = direction+1;
					new_x=x+2+3;
					new_y=y+2-1;
					data_matrix_inner(bytes, size, corner, mark, space, i+1, new_x, new_y, new_dir);
				} else {
					new_x=x-2;
					new_y=y-2;
					new_dir = direction;
					data_matrix_inner(bytes, size, corner, mark, space, i+1, new_x, new_y, new_dir);
				}
			} else {
				if ((y+2>0) || check_corner_collision(corner, size, x, y)) {
					new_dir = direction+1;
					new_x=x+2+1;
					new_y=y+2-3;
					data_matrix_inner(bytes, size, corner, mark, space,  i+1, new_x, new_y, new_dir);
				} else if (x+5>=size.x-2) {
					new_dir = direction+1;
					new_x=x-2+3;
					new_y=y-2-1;
					data_matrix_inner(bytes, size, corner, mark, space,  i+1, new_x, new_y, new_dir);
				} else {
					new_x=x+2;
					new_y=y+2;
					new_dir = direction;
					data_matrix_inner(bytes, size, corner, mark, space,  i+1, new_x, new_y, new_dir);
				}
			}
		}
	}


	// draw the symbol
	translate([2,size.y,0]) {
		//draw the data region
		data_matrix_inner(bytes, size, corner, mark, space);
		//draw the L finder pattern
		translate([-1,-size.y+1])
			2dbitmap([[for (i=[0:size.x-1]) mark]]);
		translate([-1,-size.y+2])
			2dbitmap([for (i=[0:size.y-2]) [mark]]);
		//draw the clock track
		2dbitmap([[for (i=[0:size.x-2]) (i%2)?mark:space]]);
		translate([size.x-2,-size.y+2])
			2dbitmap([for (i=[1:size.y-2]) [(i%2)?mark:space]]);
		//draw the quiet zone
		translate([-2,-size.y])
			2dbitmap([[for (i=[0:size.x+1]) space]]);
		translate([-2,-size.y+1])
			2dbitmap([for (i=[0:size.y]) [space]]);
		translate([-1,1])
			2dbitmap([[for (i=[0:size.x-1]) space]]);
		translate([size.x-1,-size.y+1])
			2dbitmap([for (i=[1:size.y+1]) [space]]);
	}
}

/* Examples */

/* 10x10 - 3 data bytes, 5 ecc bytes */
//data_matrix(dm_ecc(dm_ascii("123456")), size=[10,10], corner=0, mark="black");
/* same as above but with dm_pad(), which is redundant in this case */
//data_matrix(dm_ecc(dm_pad(dm_ascii("123456"))), size=[10,10], corner=0, mark="black");
/* same as above but with manual ecc bytes instead of dm_ecc() */
//data_matrix(concat(dm_ascii("123456"),[114,25,5,88,102]), size=[10,10], corner=0, mark="black");

/* 12x12 - 5 data bytes, 7 ecc bytes */
//data_matrix(dm_ecc(dm_pad(dm_ascii("17001164"))), size=[12,12], corner=0, mark="black");
//data_matrix(dm_ecc(concat(c40_mode(),dm_c40("H0VLP7"))), size=[12,12], corner=0, mark="black");

/* 14x14 - 8 data bytes, 10 ecc bytes */
//data_matrix(dm_ecc(concat(c40_mode(),dm_c40("TELESI"),ascii_mode(),dm_ascii("S1"))), size=[14,14], corner=1, mark="black");

/* 16x16 - 12 data bytes, 12 ecc bytes */
//data_matrix(dm_ecc(dm_pad(dm_ascii("Wikipedia"))), size=[16,16], corner=2, mark="black");

/* 18x18 - 18 data bytes, 14 ecc bytes */
//data_matrix(dm_ecc(dm_pad(dm_ascii("Hourez Jonathan"))), size=[18,18], corner=0, mark="black");

/* 20x20 - 22 data bytes, 18 ecc bytes */
//data_matrix(dm_ecc(dm_pad(concat([fnc1_mode()],dm_ascii("01034531200000111709112510ABCD1234")))), size=[20,20], corner=0, mark="black");

/* 22x22 - 30 data bytes, 20 ecc bytes */
//data_matrix(dm_ecc(dm_pad(dm_ascii("http://www.idautomation.com"))), size=[22,22], corner=1, mark="black");
data_matrix(dm_ecc(dm_pad(concat(text_mode(),dm_text("Wikipedia, the free encyclopedi"),ascii_mode(),dm_ascii("a")))), size=[22,22], corner=1, mark="black");
/* same as above but using manual padding and ecc */
//data_matrix(concat(text_mode(),dm_text("Wikipedia, the free encyclopedi"),ascii_mode(),dm_ascii("a"),EOM(),[104,254,150,45,20,78,91,227,88,60,21,174,213,62,93,103,126,46,56,95,247,47,22,65]), size=[22,22], corner=1, mark="black");

/* 24x24 - 36 data bytes, 24 ecc bytes */
//data_matrix(dm_ecc(dm_ascii("http://de.wikiquote.org/wiki/Zukunft")), size=[24,24], corner=2, mark="black");

/* 26x26 - 44 data bytes, 28 ecc bytes */
//data_matrix(dm_ecc(dm_pad(dm_ascii("http://semapedia.org/v/Mixer_(consolle)/it"))), size=[26,26], corner=0, mark="black");

/* base-256 mode example: data is 63=0x3F='?' */
//data_matrix(dm_ecc(dm_base256_append([base256_mode()],[63],fills_symbol=true)), size=[10,10], corner=0, mark="black");
